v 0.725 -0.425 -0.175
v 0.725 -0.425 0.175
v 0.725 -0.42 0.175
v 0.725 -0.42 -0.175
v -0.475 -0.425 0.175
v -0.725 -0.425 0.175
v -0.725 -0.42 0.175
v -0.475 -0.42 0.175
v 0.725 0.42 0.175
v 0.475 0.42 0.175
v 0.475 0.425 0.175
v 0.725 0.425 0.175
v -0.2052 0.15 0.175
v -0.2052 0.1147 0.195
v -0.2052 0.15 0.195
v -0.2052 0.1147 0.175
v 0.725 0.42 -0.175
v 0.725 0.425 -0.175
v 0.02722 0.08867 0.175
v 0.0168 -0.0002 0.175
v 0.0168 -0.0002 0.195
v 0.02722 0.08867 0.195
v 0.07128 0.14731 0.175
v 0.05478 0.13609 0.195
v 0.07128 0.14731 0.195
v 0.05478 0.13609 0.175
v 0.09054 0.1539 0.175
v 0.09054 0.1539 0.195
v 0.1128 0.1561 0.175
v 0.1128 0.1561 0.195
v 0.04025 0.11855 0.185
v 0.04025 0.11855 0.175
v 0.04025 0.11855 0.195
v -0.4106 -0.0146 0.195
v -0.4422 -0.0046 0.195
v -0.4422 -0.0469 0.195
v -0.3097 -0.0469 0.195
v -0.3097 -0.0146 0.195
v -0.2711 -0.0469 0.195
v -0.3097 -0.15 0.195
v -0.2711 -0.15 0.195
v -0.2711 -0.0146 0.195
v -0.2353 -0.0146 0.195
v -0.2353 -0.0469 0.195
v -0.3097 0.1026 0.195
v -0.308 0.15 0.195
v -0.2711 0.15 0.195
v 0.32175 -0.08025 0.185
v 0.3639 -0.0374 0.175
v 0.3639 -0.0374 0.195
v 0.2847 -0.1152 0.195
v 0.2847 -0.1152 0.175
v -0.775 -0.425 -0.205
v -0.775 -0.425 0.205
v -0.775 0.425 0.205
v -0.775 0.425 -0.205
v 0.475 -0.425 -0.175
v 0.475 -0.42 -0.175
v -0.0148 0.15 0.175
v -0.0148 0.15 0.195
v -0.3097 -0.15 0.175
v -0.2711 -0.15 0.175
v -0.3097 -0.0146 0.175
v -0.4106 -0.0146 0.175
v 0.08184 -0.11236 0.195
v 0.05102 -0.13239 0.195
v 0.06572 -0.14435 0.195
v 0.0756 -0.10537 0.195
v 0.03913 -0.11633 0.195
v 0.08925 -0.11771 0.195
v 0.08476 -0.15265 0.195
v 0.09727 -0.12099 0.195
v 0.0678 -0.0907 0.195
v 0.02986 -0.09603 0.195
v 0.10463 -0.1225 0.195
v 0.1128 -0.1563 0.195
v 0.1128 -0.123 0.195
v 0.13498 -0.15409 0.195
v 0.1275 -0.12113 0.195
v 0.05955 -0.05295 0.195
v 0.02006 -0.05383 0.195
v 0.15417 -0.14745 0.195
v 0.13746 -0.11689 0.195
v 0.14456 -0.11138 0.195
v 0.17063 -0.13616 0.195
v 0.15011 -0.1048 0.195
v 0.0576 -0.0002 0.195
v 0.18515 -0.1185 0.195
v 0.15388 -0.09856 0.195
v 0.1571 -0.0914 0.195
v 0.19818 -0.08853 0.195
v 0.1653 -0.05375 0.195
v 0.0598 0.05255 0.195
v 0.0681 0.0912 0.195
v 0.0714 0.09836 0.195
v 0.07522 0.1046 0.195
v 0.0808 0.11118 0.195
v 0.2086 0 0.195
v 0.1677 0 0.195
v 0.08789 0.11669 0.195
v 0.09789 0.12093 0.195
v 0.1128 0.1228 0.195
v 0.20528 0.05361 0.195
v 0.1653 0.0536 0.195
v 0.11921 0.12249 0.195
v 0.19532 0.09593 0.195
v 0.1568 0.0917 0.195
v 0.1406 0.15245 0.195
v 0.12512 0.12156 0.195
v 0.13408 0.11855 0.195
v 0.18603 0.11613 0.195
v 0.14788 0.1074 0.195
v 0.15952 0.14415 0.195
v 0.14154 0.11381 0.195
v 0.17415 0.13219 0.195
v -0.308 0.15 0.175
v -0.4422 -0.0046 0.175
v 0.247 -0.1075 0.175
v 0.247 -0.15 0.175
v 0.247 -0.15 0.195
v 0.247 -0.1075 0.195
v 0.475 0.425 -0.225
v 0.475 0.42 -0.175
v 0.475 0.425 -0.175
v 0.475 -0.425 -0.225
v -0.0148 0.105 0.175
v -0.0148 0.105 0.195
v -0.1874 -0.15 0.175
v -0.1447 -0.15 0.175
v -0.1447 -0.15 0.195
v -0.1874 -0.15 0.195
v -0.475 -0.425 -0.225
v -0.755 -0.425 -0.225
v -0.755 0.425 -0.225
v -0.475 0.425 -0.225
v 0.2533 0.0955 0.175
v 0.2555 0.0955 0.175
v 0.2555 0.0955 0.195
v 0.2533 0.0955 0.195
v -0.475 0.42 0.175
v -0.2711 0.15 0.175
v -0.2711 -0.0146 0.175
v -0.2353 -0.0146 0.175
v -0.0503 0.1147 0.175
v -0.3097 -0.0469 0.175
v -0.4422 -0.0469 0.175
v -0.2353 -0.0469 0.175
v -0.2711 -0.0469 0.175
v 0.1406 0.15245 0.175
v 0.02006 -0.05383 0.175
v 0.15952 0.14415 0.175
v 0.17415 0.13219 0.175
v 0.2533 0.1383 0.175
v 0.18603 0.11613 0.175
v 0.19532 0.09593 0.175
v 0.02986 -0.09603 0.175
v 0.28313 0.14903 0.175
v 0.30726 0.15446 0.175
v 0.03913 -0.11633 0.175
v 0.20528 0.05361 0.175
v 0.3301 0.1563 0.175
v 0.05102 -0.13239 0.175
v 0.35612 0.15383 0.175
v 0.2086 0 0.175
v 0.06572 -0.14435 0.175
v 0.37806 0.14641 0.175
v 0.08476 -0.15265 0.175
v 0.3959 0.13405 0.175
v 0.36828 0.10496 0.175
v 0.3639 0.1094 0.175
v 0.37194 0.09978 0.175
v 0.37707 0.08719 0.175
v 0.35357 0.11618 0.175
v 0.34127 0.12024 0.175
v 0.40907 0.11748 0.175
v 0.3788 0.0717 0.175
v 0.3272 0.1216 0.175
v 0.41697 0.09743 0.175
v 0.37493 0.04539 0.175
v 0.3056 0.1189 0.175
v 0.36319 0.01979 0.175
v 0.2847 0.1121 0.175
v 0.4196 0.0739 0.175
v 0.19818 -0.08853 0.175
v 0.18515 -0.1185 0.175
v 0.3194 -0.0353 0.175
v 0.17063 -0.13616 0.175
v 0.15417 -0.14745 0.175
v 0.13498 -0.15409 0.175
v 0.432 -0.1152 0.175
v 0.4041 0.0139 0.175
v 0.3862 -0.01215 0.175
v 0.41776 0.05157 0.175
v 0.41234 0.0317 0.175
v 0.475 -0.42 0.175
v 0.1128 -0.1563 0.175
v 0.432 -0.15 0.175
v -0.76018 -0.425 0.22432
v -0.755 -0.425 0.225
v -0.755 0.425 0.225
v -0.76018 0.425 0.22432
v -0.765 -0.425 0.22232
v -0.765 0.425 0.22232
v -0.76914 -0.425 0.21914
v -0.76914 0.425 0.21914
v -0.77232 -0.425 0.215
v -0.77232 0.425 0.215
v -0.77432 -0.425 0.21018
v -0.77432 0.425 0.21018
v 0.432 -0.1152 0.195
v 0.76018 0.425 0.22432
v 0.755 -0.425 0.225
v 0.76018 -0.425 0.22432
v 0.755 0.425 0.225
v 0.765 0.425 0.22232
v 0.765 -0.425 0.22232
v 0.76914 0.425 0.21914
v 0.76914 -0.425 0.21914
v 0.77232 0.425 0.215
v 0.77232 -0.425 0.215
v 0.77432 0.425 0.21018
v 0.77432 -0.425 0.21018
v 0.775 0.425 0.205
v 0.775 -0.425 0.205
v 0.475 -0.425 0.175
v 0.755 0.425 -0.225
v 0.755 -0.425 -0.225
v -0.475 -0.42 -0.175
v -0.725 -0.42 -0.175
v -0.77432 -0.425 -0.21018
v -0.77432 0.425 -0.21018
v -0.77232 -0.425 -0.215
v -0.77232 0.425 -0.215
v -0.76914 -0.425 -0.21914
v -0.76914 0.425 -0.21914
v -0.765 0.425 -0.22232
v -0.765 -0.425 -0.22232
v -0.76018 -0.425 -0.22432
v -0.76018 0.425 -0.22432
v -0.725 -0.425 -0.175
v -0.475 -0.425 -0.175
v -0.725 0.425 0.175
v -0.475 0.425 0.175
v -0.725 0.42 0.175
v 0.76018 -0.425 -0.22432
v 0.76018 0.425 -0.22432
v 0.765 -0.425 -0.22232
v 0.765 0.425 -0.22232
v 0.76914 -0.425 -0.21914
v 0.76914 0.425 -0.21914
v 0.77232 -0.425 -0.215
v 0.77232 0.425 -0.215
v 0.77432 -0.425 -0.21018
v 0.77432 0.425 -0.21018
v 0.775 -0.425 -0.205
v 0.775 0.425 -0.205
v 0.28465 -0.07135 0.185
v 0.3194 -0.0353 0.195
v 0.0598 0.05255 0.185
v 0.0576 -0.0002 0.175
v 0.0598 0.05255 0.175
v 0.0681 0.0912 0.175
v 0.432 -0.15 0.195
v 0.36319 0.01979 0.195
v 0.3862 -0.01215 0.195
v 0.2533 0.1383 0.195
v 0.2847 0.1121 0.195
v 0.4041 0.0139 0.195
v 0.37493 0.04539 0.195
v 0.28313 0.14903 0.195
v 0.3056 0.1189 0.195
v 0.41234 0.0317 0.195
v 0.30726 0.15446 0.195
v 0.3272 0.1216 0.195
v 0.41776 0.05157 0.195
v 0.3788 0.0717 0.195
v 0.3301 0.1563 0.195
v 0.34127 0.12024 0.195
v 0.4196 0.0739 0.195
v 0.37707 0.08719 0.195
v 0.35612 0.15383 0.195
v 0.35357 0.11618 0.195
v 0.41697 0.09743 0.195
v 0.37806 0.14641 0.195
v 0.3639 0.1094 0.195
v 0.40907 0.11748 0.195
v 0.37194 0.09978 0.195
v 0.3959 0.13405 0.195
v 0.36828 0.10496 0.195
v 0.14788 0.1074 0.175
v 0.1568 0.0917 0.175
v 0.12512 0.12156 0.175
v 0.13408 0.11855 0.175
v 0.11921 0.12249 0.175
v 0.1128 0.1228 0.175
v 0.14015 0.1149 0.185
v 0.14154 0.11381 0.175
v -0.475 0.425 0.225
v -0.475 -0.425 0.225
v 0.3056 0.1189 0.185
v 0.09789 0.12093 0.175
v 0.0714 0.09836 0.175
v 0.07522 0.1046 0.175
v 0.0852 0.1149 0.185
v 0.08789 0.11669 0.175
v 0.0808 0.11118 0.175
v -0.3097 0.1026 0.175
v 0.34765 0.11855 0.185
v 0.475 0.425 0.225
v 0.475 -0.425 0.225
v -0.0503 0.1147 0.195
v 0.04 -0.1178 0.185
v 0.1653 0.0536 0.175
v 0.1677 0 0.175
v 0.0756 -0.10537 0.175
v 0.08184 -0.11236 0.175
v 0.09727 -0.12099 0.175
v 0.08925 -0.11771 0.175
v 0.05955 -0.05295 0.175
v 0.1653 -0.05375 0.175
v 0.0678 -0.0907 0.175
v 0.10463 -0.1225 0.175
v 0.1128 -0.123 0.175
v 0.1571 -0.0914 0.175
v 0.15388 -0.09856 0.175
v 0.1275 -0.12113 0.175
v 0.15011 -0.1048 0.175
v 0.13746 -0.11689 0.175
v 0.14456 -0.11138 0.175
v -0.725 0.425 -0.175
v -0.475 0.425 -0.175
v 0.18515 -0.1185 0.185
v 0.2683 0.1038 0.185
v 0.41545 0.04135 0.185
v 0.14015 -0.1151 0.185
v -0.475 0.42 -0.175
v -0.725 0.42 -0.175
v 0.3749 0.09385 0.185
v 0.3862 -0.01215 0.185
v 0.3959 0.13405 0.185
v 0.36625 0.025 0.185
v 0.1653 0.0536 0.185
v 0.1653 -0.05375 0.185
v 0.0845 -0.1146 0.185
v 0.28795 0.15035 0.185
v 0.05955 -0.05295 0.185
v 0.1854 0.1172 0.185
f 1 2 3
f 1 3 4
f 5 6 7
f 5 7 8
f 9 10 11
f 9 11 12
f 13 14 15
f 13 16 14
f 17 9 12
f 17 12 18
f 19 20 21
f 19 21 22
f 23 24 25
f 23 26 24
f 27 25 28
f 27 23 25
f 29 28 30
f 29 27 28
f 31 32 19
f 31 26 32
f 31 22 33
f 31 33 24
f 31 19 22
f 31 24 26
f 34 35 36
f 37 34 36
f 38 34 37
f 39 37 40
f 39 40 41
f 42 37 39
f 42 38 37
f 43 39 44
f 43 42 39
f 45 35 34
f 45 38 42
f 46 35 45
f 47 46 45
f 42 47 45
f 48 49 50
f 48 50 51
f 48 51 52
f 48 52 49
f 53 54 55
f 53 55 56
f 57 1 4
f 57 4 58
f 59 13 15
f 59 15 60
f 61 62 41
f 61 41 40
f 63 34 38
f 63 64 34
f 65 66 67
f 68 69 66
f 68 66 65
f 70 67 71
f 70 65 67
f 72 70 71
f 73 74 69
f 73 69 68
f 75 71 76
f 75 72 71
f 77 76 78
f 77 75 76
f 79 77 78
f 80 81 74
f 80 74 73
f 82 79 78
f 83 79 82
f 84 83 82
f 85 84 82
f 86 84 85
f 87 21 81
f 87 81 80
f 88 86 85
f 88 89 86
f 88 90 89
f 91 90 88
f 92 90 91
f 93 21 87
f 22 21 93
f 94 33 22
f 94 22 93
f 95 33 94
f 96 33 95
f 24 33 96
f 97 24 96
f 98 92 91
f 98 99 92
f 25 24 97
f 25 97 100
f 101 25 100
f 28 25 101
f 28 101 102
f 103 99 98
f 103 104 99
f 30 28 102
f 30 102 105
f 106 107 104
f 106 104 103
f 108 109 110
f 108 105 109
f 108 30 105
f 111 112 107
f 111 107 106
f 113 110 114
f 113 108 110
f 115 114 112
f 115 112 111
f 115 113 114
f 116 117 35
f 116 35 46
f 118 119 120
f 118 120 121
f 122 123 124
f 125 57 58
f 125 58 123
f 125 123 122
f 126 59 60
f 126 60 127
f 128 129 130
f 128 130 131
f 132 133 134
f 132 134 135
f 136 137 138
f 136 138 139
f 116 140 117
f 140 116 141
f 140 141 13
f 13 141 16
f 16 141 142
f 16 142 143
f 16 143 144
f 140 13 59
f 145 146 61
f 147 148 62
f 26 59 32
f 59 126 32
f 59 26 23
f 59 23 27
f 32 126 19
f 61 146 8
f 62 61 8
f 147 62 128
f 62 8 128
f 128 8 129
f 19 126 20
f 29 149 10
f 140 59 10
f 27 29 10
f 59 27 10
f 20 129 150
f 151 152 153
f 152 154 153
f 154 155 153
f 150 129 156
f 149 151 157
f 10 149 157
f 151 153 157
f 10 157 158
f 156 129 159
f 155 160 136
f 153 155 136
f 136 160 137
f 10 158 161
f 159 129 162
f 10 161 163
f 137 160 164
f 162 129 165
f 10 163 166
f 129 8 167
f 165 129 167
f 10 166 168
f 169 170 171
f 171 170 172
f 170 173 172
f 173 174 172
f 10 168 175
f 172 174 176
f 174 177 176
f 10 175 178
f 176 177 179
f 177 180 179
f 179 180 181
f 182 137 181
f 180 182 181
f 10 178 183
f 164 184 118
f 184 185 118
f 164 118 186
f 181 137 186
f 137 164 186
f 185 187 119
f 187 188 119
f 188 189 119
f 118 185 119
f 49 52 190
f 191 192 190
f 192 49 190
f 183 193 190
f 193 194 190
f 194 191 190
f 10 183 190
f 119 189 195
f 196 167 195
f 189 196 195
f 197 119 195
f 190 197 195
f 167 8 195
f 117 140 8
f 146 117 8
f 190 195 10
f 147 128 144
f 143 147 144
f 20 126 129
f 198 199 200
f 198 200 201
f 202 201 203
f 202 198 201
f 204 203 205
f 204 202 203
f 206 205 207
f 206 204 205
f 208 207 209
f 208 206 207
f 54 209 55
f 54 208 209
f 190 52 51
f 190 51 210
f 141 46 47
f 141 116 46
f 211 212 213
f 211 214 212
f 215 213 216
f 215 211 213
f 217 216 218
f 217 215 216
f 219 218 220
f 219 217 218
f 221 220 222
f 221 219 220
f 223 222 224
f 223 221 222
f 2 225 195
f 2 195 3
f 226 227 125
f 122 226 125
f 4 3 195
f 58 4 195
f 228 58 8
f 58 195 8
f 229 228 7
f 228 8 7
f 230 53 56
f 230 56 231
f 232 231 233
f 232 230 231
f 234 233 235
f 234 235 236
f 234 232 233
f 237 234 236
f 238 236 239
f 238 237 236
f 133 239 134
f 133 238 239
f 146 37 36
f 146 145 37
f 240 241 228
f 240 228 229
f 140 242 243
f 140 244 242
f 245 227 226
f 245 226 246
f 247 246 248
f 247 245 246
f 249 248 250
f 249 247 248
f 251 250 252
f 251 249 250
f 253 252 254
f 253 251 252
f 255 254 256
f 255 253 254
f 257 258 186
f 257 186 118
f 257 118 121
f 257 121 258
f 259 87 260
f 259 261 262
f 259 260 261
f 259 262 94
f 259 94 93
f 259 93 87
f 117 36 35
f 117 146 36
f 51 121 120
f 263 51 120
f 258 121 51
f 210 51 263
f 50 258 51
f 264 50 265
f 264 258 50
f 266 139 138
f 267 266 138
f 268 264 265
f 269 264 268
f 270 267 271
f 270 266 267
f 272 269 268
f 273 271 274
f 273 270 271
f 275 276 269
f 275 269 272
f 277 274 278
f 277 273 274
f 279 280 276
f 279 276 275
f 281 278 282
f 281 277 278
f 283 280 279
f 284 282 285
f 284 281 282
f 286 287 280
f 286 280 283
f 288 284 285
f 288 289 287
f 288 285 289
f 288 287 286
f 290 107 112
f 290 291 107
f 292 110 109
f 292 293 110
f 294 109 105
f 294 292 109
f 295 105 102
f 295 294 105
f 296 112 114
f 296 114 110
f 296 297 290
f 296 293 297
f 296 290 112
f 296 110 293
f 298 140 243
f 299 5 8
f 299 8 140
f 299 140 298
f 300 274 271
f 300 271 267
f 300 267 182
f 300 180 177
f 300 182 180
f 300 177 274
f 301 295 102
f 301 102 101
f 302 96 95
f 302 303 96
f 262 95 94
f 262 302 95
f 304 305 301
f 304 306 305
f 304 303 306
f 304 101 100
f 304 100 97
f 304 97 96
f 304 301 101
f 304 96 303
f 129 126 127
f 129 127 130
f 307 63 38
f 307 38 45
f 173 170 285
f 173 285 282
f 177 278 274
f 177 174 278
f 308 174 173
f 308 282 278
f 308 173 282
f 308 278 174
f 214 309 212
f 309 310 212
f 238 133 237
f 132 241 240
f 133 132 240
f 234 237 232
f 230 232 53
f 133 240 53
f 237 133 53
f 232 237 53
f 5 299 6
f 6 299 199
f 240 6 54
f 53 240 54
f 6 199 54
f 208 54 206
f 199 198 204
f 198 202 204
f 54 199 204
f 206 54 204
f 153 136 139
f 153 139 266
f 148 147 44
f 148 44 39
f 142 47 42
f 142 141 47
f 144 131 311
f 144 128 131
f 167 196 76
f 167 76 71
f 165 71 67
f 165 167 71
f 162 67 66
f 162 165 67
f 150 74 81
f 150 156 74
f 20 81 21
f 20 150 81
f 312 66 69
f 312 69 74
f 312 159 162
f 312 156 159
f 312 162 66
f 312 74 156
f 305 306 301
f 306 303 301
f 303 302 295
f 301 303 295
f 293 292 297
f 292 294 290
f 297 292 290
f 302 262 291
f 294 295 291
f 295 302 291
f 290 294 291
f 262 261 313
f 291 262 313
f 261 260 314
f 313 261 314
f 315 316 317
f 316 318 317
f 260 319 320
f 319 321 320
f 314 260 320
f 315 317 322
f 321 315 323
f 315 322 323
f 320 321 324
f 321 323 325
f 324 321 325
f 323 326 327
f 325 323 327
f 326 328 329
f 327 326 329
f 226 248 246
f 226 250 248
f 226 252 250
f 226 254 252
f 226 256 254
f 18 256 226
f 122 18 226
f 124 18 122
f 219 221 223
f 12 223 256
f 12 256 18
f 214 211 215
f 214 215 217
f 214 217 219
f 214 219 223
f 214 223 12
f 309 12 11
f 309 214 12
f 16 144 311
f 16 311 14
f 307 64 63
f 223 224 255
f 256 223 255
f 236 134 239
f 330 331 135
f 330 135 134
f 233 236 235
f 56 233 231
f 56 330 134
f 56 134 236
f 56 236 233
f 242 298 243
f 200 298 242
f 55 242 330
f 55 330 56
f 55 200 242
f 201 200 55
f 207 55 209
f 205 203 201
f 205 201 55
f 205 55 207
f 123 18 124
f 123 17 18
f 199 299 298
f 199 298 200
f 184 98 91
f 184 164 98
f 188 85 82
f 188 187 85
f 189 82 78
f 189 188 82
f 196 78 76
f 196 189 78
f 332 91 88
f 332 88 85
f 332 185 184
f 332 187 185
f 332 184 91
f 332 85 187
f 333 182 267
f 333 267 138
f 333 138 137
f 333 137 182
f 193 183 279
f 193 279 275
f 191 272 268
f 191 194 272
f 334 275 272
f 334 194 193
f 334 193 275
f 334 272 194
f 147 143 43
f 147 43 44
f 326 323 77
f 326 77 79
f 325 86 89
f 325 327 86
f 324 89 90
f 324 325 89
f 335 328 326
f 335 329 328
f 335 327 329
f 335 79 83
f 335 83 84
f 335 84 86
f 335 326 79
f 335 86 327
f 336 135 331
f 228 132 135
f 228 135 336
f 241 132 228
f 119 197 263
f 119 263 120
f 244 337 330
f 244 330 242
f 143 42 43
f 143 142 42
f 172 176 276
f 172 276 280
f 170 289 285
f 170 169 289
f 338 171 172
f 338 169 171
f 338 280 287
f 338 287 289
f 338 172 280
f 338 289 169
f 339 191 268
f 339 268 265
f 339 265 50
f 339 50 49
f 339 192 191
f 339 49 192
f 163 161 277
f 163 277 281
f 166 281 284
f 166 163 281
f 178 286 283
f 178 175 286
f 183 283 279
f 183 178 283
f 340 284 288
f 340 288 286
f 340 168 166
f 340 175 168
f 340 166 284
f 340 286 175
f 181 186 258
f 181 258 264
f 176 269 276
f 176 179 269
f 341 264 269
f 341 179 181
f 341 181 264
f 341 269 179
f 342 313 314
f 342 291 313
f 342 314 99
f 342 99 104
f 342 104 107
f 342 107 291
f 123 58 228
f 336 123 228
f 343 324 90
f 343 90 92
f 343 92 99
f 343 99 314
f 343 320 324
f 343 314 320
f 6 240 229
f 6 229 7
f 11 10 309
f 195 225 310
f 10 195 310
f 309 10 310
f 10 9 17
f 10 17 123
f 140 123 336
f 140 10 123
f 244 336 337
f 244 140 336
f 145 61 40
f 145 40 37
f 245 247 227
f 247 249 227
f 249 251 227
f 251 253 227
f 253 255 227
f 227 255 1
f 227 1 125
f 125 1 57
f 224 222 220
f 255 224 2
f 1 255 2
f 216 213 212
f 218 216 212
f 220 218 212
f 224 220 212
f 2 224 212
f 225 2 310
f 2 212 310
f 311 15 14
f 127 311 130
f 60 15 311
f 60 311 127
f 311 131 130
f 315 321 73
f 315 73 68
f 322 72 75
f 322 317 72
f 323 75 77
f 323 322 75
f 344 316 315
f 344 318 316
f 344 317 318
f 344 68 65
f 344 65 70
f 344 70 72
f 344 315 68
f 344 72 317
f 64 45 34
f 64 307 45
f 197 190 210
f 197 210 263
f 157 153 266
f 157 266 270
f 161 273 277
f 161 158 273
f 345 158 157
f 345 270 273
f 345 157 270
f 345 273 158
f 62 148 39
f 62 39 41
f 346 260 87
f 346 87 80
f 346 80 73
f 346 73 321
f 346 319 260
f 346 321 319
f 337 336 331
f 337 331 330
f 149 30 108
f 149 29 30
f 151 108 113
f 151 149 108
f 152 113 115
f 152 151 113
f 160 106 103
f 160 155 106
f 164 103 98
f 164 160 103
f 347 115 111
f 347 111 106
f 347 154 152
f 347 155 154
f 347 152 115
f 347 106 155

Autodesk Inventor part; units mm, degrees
ref_plane "YZ Plane" through (0, 0, 0) normal (1, 0, 0) x (0, 1, 0)
ref_plane "XZ Plane" through (0, 0, 0) normal (0, 1, 0) x (-1, 0, 0)
ref_plane "XY Plane" through (0, 0, 0) normal (0, 0, 1) x (1, 0, 0)
sketch "Sketch1" plane through (0, 0, 0) normal (0, 1, 0) x (-1, 0, 0)
  line L0 (0.725, 0.175) -> (-0.725, 0.175)
  line L1 (-0.725, 0.175) -> (-0.725, -0.175)
  line L2 (-0.725, -0.175) -> (0.725, -0.175)
  line L3 (0.725, -0.175) -> (0.725, 0.175)
  line L4 (0.475, 0.175) -> (0.475, 0.225)
  line L5 (0.475, 0.225) -> (0.775, 0.225)
  line L6 (0.775, 0.225) -> (0.775, -0.225)
  line L7 (0.775, -0.225) -> (0.475, -0.225)
  line L8 (0.475, -0.225) -> (0.475, -0.175)
  line L9 (-0.475, 0.175) -> (-0.475, 0.225)
  line L10 (-0.475, 0.225) -> (-0.775, 0.225)
  line L11 (-0.775, 0.225) -> (-0.775, -0.225)
  line L12 (-0.775, -0.225) -> (-0.475, -0.225)
  line L13 (-0.475, -0.175) -> (-0.475, -0.225)
  line L14 (0.475, 0.175) -> (-0.475, 0.175)
  point P0 (0, 0)
  point P1 (0, 0.175)
  point P2 (0.725, 0)
  dimension "d0" = 1.55
  dimension "d1" = 0.05
  dimension "d2" = 0.05
  dimension "d3" = 0.45
  dimension "d4" = 0.3
extrude "Extrusion1" add sketch "Sketch1" along normal mid plane 0.85 contours L0 L4 L5 L6 L7 L8 L2 L3 | L0 L1 L2 L13 L12 L11 L10 L9
extrude "Extrusion2" add sketch "Sketch1" along normal mid plane 0.84 contours L3 L2 L1 L0
sketch "Sketch2" plane through (-0.475, -0.42, 0.175) normal (0, 0, 1) x (1, 0, 0)
  line L0 (0, 0) -> (0, 0.84) projected
  line L1 (0.95, 0) -> (0, 0) projected
  line L2 (0.95, 0) -> (0.95, 0.84) projected
  line L3 (0, 0.84) -> (0.95, 0.84) projected
  line L4 (0, 0.42) -> (0.95, 0.42) construction
  line L5 (0.2397, 0.3731) -> (0.2039, 0.3731)
  line L6 (0.2039, 0.3731) -> (0.2039, 0.27)
  line L7 (0.2039, 0.27) -> (0.1653, 0.27)
  line L8 (0.1653, 0.27) -> (0.1653, 0.3731)
  line L9 (0.1653, 0.3731) -> (0.0328, 0.3731)
  line L10 (0.0328, 0.3731) -> (0.0328, 0.4154)
  line L11 (0.0328, 0.4154) -> (0.167, 0.57)
  line L12 (0.167, 0.57) -> (0.2039, 0.57)
  line L13 (0.2039, 0.57) -> (0.2039, 0.4054)
  line L14 (0.2039, 0.4054) -> (0.2397, 0.4054)
  line L15 (0.2397, 0.4054) -> (0.2397, 0.3731)
  line L16 (0.1653, 0.4054) -> (0.1653, 0.5226)
  line L17 (0.1653, 0.5226) -> (0.0644, 0.4054)
  line L18 (0.0644, 0.4054) -> (0.1653, 0.4054)
  line L19 (0.4602, 0.525) -> (0.3303, 0.27)
  line L20 (0.3303, 0.27) -> (0.2876, 0.27)
  line L21 (0.2876, 0.27) -> (0.4247, 0.5347)
  line L22 (0.4247, 0.5347) -> (0.2698, 0.5347)
  line L23 (0.2698, 0.5347) -> (0.2698, 0.57)
  line L24 (0.2698, 0.57) -> (0.4602, 0.57)
  line L25 (0.4602, 0.57) -> (0.4602, 0.525)
  spline S0 degree 2 poles (0.6836, 0.42) (0.6836, 0.3393) (0.6367, 0.2637) (0.5878, 0.2637) knots 0 0 0 1 2 2 2
  spline S1 degree 2 poles (0.5878, 0.2637) (0.5382, 0.2637) (0.4918, 0.3407) (0.4918, 0.4198) knots 0 0 0 1 2 2 2
  spline S2 degree 2 poles (0.4918, 0.4198) (0.4918, 0.501) (0.5387, 0.5761) (0.5878, 0.5761) knots 0 0 0 1 2 2 2
  spline S3 degree 2 poles (0.5878, 0.5761) (0.6372, 0.5761) (0.6836, 0.4983) (0.6836, 0.42) knots 0 0 0 1 2 2 2
  spline S4 degree 2 poles (0.6321, 0.3286) (0.6379, 0.3434) (0.6427, 0.3891) (0.6427, 0.42) knots 0 0 0 1 2 2 2
  spline S5 degree 2 poles (0.6427, 0.42) (0.6427, 0.4509) (0.6379, 0.4963) (0.6318, 0.5117) knots 0 0 0 1 2 2 2
  spline S6 degree 2 poles (0.6318, 0.5117) (0.6257, 0.527) (0.6046, 0.5428) (0.5878, 0.5428) knots 0 0 0 1 2 2 2
  spline S7 degree 2 poles (0.5878, 0.5428) (0.571, 0.5428) (0.5494, 0.527) (0.5431, 0.5112) knots 0 0 0 1 2 2 2
  spline S8 degree 2 poles (0.5431, 0.5112) (0.537, 0.4959) (0.5326, 0.4492) (0.5326, 0.4198) knots 0 0 0 1 2 2 2
  spline S9 degree 2 poles (0.5326, 0.4198) (0.5326, 0.3882) (0.5365, 0.3459) (0.5428, 0.3293) knots 0 0 0 1 2 2 2
  spline S10 degree 2 poles (0.5428, 0.3293) (0.5487, 0.3138) (0.5703, 0.297) (0.5878, 0.297) knots 0 0 0 1 2 2 2
  spline S11 degree 2 poles (0.5878, 0.297) (0.6043, 0.297) (0.626, 0.3128) (0.6321, 0.3286) knots 0 0 0 1 2 2 2
  line L26 (0.907, 0.27) -> (0.722, 0.27)
  line L27 (0.722, 0.27) -> (0.722, 0.3125)
  spline S12 degree 2 poles (0.722, 0.3125) (0.7419, 0.3313) (0.7774, 0.366) (0.7944, 0.3847) knots 0 0 0 1 2 2 2
  spline S13 degree 2 poles (0.7944, 0.3847) (0.8287, 0.4224) (0.8538, 0.4676) (0.8538, 0.4917) knots 0 0 0 1 2 2 2
  spline S14 degree 2 poles (0.8538, 0.4917) (0.8538, 0.5044) (0.846, 0.5233) (0.8389, 0.5294) knots 0 0 0 1 2 2 2
  spline S15 degree 2 poles (0.8389, 0.5294) (0.8319, 0.5355) (0.8134, 0.5416) (0.8022, 0.5416) knots 0 0 0 1 2 2 2
  spline S16 degree 2 poles (0.8022, 0.5416) (0.7915, 0.5416) (0.7697, 0.5362) (0.7597, 0.5321) knots 0 0 0 1 2 2 2
  spline S17 degree 2 poles (0.7597, 0.5321) (0.7512, 0.5287) (0.7354, 0.5189) (0.7305, 0.5155) knots 0 0 0 1 2 2 2
  line L28 (0.7305, 0.5155) -> (0.7283, 0.5155)
  line L29 (0.7283, 0.5155) -> (0.7283, 0.5583)
  spline S18 degree 2 poles (0.7283, 0.5583) (0.7407, 0.5644) (0.7852, 0.5763) (0.8051, 0.5763) knots 0 0 0 1 2 2 2
  spline S19 degree 2 poles (0.8051, 0.5763) (0.8472, 0.5763) (0.8946, 0.5318) (0.8946, 0.4939) knots 0 0 0 1 2 2 2
  spline S20 degree 2 poles (0.8946, 0.4939) (0.8946, 0.4762) (0.8863, 0.4465) (0.8791, 0.4339) knots 0 0 0 1 2 2 2
  spline S21 degree 2 poles (0.8791, 0.4339) (0.8718, 0.4207) (0.8506, 0.395) (0.8389, 0.3826) knots 0 0 0 1 2 2 2
  spline S22 degree 2 poles (0.8389, 0.3826) (0.82, 0.3619) (0.7735, 0.3176) (0.7597, 0.3048) knots 0 0 0 1 2 2 2
  line L30 (0.7597, 0.3048) -> (0.907, 0.3048)
  line L31 (0.907, 0.3048) -> (0.907, 0.27)
  point P0 (0.475, 0.42)
extrude "Extrusion3" add sketch "Sketch2" along normal blind 0.02 contours L5 L6 L7 L8 L9 L10 L11 L12 L13 L14 L15 | L19 L20 L21 L22 L23 L24 L25 | S0 S1 S2 S3 | L26 L27 S12 S13 S14 S15 S16 S17 L28 L29 S18 S19 S20 S21 S22 L30 L31
fillet "Fillet1" radius 0.02 4 edges at (-0.775, 0, 0.225) (-0.775, 0, -0.225) (0.775, 0, 0.225) (0.775, 0, -0.225)
equation "\"d2\" = d1"
properties part number "21-1001" material "Copper"
